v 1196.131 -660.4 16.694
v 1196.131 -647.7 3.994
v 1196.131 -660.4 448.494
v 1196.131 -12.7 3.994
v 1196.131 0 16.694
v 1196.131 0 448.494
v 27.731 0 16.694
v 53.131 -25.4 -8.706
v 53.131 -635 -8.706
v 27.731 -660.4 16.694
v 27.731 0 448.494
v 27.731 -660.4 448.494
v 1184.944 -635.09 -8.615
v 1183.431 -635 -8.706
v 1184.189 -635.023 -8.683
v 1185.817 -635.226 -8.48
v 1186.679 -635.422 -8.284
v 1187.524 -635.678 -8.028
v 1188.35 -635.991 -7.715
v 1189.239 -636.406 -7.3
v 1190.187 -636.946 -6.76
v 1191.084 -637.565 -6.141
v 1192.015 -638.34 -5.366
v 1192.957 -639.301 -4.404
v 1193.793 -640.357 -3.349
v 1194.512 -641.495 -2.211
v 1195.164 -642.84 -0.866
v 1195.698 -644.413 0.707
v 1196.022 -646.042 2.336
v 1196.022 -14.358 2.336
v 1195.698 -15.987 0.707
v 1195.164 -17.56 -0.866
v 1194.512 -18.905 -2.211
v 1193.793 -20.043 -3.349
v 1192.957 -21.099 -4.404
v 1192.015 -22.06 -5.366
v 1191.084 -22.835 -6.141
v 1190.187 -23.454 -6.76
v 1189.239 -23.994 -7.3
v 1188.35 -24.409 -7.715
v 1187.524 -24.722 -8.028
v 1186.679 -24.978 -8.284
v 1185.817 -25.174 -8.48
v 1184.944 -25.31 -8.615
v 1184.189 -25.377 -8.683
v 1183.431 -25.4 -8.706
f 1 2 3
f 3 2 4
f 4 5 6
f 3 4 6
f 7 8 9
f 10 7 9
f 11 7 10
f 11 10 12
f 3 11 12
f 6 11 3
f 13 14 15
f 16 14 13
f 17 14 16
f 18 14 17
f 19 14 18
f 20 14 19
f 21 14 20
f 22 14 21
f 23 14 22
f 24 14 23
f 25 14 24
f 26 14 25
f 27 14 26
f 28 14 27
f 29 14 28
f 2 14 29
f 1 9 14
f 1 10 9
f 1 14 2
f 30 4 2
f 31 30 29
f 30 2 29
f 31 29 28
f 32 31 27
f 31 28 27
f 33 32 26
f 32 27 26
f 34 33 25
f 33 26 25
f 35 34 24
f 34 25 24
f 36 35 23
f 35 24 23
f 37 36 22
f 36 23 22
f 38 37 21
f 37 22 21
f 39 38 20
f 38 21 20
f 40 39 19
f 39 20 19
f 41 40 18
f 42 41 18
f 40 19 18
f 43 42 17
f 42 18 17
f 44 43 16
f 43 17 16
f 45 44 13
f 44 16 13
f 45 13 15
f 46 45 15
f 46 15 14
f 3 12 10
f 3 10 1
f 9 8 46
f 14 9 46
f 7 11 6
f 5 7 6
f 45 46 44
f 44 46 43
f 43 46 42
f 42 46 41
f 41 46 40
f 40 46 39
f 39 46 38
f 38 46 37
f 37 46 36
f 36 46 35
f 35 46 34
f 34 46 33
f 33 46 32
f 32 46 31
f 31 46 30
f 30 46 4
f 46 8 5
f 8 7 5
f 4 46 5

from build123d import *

# Parameters (mm, degrees)
F0_W     = 1168.4
F0_H     = 457.2
F1_DEPTH = 660.4
F2_SIZE  = 25.4
F3_R     = 12.7


with BuildPart() as f1:
    # F0 (on Front) → F1 (new body)
    with BuildSketch(Plane.XZ):
        with Locations((611.931063, 219.894172)):
            Rectangle(F0_W, F0_H)
    extrude(amount=F1_DEPTH)

    # F2
    f2_edges = [f1.edges().sort_by_distance(p)[0] for p in [
        (611.931063, -660.4, -8.705828),
        (27.731063, -330.2, -8.705828),
        (611.931063, 0, -8.705828),
    ]]
    chamfer(f2_edges, length=F2_SIZE)

    # F3
    f3_edges = [f1.edges().sort_by_distance(p)[0] for p in [
        (1196.131063, -330.2, -8.705828),
    ]]
    fillet(f3_edges, radius=F3_R)


solid = f1.part
